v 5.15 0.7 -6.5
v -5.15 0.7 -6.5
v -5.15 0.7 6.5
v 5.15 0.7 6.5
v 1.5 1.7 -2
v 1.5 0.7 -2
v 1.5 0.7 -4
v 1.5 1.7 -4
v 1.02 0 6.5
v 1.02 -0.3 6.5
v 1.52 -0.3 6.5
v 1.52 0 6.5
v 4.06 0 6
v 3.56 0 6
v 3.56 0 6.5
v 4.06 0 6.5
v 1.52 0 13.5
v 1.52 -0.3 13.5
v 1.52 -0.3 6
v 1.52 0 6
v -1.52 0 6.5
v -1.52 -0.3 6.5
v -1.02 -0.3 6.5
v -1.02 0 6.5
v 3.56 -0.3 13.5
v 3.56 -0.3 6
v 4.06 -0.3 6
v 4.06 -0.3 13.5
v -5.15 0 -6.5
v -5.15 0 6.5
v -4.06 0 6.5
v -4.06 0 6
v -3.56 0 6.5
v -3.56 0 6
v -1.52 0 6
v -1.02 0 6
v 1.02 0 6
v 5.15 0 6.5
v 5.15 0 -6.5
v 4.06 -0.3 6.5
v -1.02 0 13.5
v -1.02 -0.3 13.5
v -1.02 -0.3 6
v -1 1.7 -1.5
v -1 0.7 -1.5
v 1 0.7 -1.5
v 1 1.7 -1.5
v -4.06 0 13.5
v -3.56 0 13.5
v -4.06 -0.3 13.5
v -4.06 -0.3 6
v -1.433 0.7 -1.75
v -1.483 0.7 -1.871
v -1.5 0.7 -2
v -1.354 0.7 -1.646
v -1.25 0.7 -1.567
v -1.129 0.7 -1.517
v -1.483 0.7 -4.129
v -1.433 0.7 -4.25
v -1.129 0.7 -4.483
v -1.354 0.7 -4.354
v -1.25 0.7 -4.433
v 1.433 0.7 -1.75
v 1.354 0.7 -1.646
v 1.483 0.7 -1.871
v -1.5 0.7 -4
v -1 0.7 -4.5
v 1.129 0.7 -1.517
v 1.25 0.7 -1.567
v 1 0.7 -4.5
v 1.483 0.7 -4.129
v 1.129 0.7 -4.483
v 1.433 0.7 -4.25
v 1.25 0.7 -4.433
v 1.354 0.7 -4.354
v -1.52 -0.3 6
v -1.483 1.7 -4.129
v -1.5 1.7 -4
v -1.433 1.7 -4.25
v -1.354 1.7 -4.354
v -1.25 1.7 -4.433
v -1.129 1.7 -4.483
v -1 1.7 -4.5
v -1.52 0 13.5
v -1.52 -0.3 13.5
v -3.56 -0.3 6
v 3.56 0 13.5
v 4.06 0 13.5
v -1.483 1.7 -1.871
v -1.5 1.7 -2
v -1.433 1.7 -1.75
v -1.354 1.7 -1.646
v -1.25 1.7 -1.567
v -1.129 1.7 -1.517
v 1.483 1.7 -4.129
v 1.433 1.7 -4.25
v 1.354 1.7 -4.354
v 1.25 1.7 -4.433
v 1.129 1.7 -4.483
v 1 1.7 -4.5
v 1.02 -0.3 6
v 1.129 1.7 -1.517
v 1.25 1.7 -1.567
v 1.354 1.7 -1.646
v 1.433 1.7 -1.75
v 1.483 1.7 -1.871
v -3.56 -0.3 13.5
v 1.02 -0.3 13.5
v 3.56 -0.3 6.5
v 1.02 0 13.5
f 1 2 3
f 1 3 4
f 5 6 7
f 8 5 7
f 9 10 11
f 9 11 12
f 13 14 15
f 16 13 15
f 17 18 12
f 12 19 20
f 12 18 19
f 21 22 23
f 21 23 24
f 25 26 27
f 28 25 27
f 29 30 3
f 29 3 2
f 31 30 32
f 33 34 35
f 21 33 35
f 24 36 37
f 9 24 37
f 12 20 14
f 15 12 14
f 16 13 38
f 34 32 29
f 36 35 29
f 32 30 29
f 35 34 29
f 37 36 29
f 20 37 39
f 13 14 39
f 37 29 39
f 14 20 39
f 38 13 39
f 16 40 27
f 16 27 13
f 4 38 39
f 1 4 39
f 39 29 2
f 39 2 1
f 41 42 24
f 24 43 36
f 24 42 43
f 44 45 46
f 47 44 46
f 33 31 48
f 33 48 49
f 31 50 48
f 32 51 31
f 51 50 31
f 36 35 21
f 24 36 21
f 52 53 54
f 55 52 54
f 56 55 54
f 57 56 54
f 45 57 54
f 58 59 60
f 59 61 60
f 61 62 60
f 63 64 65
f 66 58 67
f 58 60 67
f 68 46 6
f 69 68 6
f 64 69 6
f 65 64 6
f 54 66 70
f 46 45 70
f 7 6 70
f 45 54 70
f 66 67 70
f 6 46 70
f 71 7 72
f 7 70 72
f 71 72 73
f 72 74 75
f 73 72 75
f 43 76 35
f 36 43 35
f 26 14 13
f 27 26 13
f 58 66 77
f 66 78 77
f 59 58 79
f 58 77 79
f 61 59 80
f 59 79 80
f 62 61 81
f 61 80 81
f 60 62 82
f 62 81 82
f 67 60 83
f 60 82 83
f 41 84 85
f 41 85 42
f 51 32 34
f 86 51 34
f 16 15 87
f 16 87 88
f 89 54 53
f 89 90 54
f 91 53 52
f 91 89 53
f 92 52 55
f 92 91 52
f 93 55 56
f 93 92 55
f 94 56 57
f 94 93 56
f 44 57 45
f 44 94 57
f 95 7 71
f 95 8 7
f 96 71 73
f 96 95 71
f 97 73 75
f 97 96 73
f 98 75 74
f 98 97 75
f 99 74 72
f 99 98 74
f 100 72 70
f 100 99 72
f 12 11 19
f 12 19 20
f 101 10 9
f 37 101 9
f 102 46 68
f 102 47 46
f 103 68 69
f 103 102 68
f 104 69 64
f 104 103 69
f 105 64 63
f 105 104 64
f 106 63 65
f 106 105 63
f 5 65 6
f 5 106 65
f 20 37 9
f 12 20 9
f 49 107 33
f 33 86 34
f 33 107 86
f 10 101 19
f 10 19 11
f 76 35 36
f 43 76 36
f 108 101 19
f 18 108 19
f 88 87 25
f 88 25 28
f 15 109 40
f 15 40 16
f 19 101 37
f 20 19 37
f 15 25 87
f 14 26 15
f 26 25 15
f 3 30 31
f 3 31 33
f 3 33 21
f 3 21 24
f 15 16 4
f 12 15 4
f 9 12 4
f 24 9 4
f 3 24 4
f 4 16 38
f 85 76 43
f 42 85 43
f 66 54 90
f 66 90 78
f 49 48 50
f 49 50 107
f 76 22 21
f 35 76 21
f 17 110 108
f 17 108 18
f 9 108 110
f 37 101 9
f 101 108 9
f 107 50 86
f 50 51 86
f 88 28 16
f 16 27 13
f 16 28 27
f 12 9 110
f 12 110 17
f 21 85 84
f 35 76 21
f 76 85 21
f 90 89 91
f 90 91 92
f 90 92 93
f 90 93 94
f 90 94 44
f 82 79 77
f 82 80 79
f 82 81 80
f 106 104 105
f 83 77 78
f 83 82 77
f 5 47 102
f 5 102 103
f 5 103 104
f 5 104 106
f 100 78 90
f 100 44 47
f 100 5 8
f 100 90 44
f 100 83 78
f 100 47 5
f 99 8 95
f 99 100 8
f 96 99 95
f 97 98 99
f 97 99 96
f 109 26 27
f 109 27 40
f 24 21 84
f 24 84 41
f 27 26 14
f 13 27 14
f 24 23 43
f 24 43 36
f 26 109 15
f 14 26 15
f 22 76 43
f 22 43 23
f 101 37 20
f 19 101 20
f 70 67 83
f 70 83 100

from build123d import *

# Parameters (mm, degrees)
SKETCH_1_W                   = 10.3
SKETCH_1_H                   = 13
EXTRUDE_1_DEPTH              = 0.7
SKETCH_2_W                   = 3
SKETCH_2_H                   = 3
EXTRUDE_2_DEPTH              = 1
FILLET_1_R                   = 0.5
SKETCH_3_W                   = 0.5
SKETCH_3_H                   = 0.5
EXTRUDE_3_DEPTH              = 0.3
SKETCH_4_W                   = 0.5
SKETCH_4_H                   = 0.3
EXTRUDE_4_DEPTH              = 7
PATTERN_START                = 3.56
PATTERN_LINEAR_1_OUTLINE_W   = 0.3
PATTERN_LINEAR_1_OUTLINE_H   = 0.5
PATTERN_LINEAR_1_DEPTH       = 0.5
PATTERN_START_2              = 1.02
PATTERN_LINEAR_1_2_OUTLINE_W = 0.3
PATTERN_LINEAR_1_2_OUTLINE_H = 0.5
PATTERN_LINEAR_1_2_DEPTH     = 0.5
PATTERN_START_3              = -1.52
PATTERN_LINEAR_1_3_OUTLINE_W = 0.3
PATTERN_LINEAR_1_3_OUTLINE_H = 0.5
PATTERN_LINEAR_1_3_DEPTH     = 0.5
PATTERN_START_4              = 6
PATTERN_LINEAR_1_4_OUTLINE_W = 0.5
PATTERN_LINEAR_1_4_OUTLINE_H = 0.3
PATTERN_LINEAR_1_4_DEPTH     = 7.5


# Read off the part's stored shape, not the designer's step: Линейный массив1
with BuildPart() as part:
    # Эскиз1 → Бобышка-Вытянуть1 (new body)
    with BuildSketch(Plane(origin=(0, 0, 0), x_dir=(1, 0, 0), z_dir=(0, 1, 0))):
        Rectangle(SKETCH_1_W, SKETCH_1_H)
    extrude(amount=EXTRUDE_1_DEPTH)



with BuildPart() as body_2:
    # Эскиз2 → Бобышка-Вытянуть2 (new body)
    with BuildSketch(Plane(origin=(0, 0.7, 0), x_dir=(1, 0, 0), z_dir=(0, 1, 0))):
        with Locations((0, 3)):
            Rectangle(SKETCH_2_W, SKETCH_2_H)
    extrude(amount=EXTRUDE_2_DEPTH)

    # Скругление1
    fillet_1_edges = [body_2.edges().sort_by_distance(p)[0] for p in [
        (1.5, 1.2, -1.5),
        (-1.5, 1.2, -1.5),
        (-1.5, 1.2, -4.5),
        (1.5, 1.2, -4.5),
    ]]
    fillet(fillet_1_edges, radius=FILLET_1_R)


with BuildPart() as body_3:
    # Эскиз3 → Бобышка-Вытянуть3 (new body)
    with BuildSketch(Plane.XZ):
        with Locations((-3.81, 6.25)):
            Rectangle(SKETCH_3_W, SKETCH_3_H)
    extrude(amount=EXTRUDE_3_DEPTH)


with BuildPart() as part_1:
    add(part.part)

    add(body_3.part)  # Бобышка-Вытянуть4 merges body 3
    # Эскиз4 → Бобышка-Вытянуть4 (add)
    with BuildSketch(Plane.XY.offset(6.5)):
        with Locations((-3.81, -0.15)):
            Rectangle(SKETCH_4_W, SKETCH_4_H)
    extrude(amount=EXTRUDE_4_DEPTH)

    # Pattern Linear 1 4 outline → Pattern Linear 1 4 (add)
    with BuildSketch(Plane.XY.offset(PATTERN_START_4)):
        with Locations((-1.27, -0.15)):
            Rectangle(PATTERN_LINEAR_1_4_OUTLINE_W, PATTERN_LINEAR_1_4_OUTLINE_H)
        with Locations((1.27, -0.15)):
            Rectangle(PATTERN_LINEAR_1_4_OUTLINE_W, PATTERN_LINEAR_1_4_OUTLINE_H)
        with Locations((3.81, -0.15)):
            Rectangle(PATTERN_LINEAR_1_4_OUTLINE_W, PATTERN_LINEAR_1_4_OUTLINE_H)
    extrude(amount=PATTERN_LINEAR_1_4_DEPTH)


with BuildPart() as body_3_2:
    # Линейный массив1 outline → Линейный массив1 (new body)
    with BuildSketch(Plane.YZ.offset(PATTERN_START)):
        with Locations((-0.15, 6.25)):
            Rectangle(PATTERN_LINEAR_1_OUTLINE_W, PATTERN_LINEAR_1_OUTLINE_H)
    extrude(amount=PATTERN_LINEAR_1_DEPTH)


with BuildPart() as body_4:
    # Pattern Linear 1 2 outline → Pattern Linear 1 2 (new body)
    with BuildSketch(Plane.YZ.offset(PATTERN_START_2)):
        with Locations((-0.15, 6.25)):
            Rectangle(PATTERN_LINEAR_1_2_OUTLINE_W, PATTERN_LINEAR_1_2_OUTLINE_H)
    extrude(amount=PATTERN_LINEAR_1_2_DEPTH)


with BuildPart() as body_5:
    # Pattern Linear 1 3 outline → Pattern Linear 1 3 (new body)
    with BuildSketch(Plane.YZ.offset(PATTERN_START_3)):
        with Locations((-0.15, 6.25)):
            Rectangle(PATTERN_LINEAR_1_3_OUTLINE_W, PATTERN_LINEAR_1_3_OUTLINE_H)
    extrude(amount=PATTERN_LINEAR_1_3_DEPTH)


solid = Compound([body_2.part, part_1.part, body_3_2.part, body_4.part, body_5.part])
